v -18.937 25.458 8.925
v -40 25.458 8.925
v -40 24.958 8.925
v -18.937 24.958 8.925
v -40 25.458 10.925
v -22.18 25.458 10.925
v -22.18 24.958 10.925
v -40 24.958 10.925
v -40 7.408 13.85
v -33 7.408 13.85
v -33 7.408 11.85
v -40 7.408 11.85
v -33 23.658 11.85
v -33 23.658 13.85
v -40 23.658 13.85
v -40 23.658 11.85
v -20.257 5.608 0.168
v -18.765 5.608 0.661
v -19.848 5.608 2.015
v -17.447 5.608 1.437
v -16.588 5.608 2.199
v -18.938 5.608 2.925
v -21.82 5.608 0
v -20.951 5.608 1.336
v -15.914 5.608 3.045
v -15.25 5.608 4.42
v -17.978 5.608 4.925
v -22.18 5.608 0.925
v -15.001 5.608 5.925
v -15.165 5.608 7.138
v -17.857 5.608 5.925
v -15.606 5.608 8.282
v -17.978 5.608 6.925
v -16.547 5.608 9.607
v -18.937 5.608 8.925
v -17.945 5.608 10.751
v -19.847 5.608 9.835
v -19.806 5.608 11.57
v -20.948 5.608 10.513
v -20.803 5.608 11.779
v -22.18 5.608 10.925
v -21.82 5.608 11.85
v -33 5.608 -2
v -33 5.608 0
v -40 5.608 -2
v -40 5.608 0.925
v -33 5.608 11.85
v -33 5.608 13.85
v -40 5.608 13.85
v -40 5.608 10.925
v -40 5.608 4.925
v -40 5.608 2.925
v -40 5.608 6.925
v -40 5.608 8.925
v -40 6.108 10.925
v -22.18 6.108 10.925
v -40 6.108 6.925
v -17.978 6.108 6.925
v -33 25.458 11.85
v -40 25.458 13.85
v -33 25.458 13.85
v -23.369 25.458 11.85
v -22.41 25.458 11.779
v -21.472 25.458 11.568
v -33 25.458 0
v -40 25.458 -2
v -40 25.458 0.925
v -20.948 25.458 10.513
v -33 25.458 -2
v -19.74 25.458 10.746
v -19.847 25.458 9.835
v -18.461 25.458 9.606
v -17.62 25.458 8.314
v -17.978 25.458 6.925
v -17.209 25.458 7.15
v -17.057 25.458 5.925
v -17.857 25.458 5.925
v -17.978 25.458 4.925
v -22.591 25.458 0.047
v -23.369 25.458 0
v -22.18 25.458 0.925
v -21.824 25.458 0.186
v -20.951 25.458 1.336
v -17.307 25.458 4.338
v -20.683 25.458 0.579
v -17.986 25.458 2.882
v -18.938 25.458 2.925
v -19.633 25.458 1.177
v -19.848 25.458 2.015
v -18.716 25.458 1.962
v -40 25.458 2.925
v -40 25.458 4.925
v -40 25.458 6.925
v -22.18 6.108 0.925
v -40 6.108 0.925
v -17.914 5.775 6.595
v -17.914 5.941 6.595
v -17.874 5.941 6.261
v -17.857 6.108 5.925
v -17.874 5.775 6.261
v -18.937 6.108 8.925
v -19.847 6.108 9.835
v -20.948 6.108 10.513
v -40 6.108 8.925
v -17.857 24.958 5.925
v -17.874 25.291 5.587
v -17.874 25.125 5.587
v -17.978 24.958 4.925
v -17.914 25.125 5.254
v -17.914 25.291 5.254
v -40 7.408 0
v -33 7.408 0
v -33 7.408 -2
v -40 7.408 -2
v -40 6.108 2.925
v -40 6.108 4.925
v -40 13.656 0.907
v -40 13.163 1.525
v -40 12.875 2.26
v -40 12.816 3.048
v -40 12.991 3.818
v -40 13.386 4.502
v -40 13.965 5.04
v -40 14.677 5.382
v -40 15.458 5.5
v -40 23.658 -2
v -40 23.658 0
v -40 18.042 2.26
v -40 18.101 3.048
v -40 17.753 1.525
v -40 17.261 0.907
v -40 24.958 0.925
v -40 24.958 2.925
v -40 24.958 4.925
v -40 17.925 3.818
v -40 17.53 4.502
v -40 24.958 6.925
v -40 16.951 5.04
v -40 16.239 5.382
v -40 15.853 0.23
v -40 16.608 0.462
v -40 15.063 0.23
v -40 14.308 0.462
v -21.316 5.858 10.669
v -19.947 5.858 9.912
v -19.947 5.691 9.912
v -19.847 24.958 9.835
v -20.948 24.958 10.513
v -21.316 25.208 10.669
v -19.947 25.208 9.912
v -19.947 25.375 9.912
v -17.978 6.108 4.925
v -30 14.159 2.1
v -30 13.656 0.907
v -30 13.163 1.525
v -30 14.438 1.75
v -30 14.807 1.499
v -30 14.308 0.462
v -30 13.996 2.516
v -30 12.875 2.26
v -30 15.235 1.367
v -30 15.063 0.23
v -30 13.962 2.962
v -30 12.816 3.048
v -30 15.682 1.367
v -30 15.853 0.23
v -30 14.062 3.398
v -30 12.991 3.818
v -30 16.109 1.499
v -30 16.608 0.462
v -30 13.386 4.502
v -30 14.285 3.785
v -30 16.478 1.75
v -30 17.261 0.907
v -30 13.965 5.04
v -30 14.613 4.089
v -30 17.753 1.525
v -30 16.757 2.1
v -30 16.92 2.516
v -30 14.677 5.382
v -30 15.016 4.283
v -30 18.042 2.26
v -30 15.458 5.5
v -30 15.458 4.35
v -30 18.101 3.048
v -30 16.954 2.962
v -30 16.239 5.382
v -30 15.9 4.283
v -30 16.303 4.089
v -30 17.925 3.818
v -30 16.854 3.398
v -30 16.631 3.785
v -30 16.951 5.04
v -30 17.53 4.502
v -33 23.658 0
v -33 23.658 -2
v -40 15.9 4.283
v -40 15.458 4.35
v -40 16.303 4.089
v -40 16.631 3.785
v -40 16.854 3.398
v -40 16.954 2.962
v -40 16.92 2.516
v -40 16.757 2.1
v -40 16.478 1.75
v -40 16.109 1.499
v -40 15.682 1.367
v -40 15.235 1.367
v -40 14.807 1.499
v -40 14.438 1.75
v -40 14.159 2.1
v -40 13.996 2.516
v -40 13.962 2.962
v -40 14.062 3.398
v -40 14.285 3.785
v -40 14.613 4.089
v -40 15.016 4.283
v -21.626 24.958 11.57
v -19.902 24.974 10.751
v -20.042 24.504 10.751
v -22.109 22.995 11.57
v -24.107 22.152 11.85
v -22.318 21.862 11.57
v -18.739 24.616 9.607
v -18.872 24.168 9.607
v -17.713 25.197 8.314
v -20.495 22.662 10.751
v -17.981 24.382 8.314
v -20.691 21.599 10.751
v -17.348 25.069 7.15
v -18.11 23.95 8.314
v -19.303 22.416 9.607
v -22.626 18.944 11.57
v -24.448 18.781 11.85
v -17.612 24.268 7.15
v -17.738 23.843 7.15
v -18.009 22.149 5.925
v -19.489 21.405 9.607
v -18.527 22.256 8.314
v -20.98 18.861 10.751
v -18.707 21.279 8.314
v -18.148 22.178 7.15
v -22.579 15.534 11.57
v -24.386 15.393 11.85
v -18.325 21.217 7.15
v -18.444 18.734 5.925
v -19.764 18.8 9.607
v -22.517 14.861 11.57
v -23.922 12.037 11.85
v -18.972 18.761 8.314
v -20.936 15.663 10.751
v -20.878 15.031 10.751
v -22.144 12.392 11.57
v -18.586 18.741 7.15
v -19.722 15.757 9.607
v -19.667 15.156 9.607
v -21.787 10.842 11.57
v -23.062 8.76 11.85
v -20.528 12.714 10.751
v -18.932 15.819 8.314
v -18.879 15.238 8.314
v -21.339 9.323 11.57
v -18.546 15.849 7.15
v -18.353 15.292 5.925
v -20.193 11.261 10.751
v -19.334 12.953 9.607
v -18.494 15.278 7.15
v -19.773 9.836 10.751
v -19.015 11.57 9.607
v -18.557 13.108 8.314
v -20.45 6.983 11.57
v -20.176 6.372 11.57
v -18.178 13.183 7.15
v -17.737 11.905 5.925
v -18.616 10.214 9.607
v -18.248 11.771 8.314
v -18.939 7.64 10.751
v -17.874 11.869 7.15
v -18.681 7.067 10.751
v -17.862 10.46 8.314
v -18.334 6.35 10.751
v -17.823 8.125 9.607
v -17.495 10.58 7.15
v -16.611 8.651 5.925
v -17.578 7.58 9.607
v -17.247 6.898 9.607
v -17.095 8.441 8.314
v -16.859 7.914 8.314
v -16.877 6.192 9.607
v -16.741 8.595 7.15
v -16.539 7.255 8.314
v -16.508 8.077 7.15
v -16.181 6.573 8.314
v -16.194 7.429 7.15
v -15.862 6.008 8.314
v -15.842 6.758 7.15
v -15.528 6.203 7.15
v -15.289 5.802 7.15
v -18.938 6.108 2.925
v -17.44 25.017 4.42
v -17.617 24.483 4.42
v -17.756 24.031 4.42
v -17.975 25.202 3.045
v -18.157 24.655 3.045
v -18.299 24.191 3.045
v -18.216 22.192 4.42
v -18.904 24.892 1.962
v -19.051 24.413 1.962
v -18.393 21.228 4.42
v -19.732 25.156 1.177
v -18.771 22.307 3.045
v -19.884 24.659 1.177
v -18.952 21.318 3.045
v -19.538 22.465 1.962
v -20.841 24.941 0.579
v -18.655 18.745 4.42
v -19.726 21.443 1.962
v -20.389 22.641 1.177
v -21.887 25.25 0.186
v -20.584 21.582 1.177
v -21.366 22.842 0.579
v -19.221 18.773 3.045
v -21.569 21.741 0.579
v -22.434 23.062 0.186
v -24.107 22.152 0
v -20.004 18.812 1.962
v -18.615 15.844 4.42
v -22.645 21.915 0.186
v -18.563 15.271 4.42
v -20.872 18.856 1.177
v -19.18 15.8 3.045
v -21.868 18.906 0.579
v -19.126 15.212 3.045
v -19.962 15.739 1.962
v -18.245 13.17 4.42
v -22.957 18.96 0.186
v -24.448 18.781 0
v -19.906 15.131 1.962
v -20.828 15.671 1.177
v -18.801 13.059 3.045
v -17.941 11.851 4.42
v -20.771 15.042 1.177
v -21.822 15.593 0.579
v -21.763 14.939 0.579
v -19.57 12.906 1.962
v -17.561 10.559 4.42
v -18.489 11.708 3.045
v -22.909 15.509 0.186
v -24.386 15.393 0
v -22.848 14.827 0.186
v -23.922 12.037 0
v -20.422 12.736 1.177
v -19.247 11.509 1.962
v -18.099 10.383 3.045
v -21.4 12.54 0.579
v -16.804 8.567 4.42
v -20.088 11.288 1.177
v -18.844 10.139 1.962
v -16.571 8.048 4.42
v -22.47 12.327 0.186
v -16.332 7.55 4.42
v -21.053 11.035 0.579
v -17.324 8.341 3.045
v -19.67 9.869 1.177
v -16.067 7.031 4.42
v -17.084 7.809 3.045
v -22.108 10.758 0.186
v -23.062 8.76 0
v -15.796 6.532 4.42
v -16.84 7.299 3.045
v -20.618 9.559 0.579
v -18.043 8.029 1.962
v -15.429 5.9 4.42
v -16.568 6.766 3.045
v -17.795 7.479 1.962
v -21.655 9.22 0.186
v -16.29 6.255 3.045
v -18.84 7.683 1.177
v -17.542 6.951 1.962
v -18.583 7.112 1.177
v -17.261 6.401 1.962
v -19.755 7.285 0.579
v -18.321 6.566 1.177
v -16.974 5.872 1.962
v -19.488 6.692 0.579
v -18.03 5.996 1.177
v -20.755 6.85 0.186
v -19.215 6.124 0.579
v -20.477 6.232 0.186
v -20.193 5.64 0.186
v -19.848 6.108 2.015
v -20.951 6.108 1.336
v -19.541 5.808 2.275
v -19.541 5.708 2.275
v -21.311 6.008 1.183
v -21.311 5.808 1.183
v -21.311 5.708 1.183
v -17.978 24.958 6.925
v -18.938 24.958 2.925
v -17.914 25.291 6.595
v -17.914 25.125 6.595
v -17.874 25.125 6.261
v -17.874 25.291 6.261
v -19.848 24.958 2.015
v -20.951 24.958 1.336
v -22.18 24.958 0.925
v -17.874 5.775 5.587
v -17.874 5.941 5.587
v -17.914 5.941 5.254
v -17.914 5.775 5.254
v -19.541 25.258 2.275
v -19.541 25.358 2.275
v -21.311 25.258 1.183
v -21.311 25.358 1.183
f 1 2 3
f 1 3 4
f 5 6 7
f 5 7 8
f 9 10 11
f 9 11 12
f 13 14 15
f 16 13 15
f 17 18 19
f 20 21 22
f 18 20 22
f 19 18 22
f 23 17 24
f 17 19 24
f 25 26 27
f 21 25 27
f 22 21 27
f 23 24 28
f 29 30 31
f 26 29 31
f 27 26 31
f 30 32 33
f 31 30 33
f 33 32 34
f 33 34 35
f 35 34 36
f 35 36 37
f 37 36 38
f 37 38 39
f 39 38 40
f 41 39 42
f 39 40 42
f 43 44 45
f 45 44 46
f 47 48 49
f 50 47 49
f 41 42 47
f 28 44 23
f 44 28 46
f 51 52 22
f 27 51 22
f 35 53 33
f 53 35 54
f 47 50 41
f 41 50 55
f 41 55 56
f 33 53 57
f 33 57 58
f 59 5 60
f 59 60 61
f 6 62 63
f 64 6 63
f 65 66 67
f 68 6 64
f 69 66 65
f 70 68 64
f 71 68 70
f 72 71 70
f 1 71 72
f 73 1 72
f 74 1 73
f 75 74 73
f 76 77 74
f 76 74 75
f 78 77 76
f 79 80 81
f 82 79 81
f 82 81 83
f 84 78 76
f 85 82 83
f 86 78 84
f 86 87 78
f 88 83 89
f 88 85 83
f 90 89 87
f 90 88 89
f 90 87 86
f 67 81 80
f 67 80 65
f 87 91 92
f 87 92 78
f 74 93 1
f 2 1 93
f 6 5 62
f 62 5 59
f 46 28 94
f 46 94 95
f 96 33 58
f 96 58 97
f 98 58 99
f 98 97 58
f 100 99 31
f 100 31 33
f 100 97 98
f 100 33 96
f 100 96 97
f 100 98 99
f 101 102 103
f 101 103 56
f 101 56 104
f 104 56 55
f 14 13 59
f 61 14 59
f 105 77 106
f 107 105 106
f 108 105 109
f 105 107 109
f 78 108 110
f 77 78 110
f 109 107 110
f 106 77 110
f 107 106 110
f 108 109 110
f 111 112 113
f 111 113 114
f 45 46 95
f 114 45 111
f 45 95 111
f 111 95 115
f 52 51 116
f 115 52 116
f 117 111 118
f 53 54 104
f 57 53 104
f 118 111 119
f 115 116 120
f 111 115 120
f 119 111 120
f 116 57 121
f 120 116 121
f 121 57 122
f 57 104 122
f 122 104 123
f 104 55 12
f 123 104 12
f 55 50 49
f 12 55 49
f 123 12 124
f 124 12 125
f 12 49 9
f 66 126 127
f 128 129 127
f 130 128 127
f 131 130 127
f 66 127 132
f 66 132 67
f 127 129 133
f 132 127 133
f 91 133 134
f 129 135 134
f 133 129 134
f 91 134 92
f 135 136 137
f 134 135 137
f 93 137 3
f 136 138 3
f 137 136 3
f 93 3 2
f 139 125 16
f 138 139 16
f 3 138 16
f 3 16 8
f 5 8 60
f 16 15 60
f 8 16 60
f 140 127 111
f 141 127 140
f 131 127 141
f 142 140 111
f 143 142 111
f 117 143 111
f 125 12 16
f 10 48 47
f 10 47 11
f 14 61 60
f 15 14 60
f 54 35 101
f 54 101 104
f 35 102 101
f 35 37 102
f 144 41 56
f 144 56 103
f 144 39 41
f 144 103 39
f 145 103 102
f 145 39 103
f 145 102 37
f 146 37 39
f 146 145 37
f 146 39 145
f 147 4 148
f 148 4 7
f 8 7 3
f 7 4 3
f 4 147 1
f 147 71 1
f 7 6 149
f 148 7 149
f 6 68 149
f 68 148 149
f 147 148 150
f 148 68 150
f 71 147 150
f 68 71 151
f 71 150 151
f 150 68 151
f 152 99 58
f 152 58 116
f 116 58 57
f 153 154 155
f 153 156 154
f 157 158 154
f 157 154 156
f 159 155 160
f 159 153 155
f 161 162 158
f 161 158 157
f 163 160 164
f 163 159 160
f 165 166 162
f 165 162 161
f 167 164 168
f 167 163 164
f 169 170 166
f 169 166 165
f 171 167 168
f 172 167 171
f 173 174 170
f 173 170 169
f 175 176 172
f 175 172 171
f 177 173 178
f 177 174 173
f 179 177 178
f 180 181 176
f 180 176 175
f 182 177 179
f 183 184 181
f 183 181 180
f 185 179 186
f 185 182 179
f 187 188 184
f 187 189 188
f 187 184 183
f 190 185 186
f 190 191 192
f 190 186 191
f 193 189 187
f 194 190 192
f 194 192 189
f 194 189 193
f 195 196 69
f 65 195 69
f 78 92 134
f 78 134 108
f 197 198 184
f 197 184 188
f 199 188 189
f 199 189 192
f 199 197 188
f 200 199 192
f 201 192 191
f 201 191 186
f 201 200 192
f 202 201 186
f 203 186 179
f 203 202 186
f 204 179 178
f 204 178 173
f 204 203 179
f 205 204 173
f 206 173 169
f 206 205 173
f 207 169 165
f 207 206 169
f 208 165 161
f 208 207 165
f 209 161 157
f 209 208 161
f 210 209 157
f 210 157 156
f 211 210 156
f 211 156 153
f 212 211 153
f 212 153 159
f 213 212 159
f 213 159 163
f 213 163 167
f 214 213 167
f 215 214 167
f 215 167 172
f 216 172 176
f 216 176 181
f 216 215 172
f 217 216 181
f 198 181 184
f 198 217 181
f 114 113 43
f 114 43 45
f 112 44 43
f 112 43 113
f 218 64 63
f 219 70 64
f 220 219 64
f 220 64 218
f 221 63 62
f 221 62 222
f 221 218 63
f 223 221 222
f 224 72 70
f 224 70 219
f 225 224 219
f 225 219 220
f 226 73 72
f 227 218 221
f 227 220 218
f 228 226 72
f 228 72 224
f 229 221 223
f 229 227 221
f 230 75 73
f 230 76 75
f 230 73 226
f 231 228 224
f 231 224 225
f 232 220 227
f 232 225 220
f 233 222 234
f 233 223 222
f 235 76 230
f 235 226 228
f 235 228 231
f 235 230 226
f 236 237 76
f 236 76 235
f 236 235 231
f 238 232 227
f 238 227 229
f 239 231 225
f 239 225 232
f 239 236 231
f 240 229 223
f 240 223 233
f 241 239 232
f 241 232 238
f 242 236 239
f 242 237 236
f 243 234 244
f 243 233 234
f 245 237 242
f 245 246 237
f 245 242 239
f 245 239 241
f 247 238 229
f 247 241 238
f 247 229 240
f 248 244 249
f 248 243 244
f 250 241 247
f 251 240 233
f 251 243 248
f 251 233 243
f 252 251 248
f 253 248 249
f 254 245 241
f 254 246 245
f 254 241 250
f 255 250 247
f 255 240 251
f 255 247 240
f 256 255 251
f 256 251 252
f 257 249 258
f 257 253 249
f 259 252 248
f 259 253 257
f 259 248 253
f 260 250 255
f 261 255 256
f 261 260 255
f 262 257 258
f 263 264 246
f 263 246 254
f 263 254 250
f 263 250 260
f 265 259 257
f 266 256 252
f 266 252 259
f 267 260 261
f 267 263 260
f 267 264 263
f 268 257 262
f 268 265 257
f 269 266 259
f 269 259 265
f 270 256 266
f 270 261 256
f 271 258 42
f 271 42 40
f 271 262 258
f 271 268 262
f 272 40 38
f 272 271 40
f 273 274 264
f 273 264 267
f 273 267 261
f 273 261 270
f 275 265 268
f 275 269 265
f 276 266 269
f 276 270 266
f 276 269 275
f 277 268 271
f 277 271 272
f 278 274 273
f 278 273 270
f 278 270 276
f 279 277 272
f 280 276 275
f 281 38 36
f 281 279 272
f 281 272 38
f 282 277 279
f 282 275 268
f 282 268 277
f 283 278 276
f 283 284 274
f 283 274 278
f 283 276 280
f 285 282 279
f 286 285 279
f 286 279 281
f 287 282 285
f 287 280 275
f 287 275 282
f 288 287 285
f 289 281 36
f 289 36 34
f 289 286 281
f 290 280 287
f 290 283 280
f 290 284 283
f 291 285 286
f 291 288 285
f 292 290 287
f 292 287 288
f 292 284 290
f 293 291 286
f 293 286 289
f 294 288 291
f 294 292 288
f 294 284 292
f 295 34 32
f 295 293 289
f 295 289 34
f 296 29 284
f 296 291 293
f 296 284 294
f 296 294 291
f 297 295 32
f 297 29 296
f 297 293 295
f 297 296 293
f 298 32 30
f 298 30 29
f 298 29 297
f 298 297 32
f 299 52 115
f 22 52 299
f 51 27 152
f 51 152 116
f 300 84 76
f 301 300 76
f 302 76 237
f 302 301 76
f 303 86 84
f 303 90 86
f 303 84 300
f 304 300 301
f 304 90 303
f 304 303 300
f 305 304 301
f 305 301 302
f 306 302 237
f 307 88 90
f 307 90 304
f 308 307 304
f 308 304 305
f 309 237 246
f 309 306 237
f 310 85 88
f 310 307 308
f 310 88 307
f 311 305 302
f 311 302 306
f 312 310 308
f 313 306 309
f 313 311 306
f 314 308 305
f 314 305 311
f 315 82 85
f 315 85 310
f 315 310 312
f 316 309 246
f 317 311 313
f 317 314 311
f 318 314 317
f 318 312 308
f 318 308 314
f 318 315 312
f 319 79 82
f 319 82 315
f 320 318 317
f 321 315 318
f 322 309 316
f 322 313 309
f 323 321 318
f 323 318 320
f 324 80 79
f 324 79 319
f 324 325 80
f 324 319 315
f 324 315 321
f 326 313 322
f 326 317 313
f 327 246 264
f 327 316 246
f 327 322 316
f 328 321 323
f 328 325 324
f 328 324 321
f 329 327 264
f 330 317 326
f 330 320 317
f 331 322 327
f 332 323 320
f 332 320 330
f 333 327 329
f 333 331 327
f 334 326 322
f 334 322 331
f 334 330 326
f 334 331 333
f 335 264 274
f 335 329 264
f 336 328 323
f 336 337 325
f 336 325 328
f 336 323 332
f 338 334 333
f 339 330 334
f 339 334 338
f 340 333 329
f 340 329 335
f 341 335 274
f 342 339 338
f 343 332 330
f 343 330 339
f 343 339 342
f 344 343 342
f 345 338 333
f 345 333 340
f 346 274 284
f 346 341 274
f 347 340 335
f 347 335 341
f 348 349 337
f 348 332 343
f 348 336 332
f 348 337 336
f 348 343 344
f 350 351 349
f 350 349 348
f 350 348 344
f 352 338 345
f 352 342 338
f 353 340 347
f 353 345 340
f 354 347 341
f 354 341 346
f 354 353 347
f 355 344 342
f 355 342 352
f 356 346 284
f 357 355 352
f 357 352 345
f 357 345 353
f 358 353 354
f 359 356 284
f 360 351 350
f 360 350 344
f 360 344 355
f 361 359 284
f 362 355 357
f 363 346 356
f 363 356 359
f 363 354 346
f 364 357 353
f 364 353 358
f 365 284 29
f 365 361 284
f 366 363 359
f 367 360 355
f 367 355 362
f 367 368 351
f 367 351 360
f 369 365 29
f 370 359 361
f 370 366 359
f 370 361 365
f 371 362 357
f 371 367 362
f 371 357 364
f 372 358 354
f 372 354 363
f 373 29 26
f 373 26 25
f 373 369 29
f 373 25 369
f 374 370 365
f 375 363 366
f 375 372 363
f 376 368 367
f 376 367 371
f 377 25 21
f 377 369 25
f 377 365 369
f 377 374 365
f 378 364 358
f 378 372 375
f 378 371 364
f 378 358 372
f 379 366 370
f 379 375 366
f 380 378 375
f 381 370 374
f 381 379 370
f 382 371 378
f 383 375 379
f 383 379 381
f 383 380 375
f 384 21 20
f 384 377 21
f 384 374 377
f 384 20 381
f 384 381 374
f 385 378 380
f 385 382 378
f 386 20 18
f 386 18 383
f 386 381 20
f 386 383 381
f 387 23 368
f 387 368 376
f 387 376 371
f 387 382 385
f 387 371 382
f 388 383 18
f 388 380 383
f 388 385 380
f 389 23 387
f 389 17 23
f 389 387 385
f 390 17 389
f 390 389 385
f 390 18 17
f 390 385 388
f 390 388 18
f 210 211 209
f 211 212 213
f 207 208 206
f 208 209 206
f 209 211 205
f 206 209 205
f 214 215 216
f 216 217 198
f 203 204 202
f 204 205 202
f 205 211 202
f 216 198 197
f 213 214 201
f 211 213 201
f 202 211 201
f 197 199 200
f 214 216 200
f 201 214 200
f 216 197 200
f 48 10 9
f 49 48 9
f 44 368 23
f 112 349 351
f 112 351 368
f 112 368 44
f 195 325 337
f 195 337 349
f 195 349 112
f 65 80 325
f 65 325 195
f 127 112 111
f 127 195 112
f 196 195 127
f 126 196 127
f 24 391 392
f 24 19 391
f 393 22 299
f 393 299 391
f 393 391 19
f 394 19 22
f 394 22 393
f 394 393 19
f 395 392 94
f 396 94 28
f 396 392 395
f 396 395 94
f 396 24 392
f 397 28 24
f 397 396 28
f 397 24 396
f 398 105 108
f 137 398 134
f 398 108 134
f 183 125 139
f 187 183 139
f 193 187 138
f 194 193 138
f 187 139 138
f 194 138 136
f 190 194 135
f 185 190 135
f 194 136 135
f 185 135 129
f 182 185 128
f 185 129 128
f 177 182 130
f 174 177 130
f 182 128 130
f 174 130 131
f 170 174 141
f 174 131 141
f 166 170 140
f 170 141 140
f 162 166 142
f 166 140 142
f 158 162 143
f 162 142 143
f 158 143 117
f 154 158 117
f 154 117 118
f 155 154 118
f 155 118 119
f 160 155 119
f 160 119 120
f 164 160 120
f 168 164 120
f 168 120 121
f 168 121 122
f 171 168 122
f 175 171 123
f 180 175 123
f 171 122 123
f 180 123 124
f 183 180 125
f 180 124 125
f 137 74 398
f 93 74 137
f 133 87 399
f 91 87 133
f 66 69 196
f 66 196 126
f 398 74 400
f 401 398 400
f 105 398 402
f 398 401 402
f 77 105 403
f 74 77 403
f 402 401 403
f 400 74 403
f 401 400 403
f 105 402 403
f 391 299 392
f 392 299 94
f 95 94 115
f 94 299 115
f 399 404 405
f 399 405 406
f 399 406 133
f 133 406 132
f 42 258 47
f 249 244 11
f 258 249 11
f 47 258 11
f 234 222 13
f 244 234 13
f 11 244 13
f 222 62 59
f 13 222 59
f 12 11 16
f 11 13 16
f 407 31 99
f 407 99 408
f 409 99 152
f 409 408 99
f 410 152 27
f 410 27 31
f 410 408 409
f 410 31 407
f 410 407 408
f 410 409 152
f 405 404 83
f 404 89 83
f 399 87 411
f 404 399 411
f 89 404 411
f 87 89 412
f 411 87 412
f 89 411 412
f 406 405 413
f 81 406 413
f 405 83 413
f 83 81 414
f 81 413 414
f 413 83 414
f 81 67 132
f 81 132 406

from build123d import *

# Parameters (mm, degrees)
BOSS_EXTRUDE1_DEPTH      = 11.85
BOSS_EXTRUDE2_DEPTH      = 2
BOSS_EXTRUDE2_DEPTH_BACK = 13.85
SKETCH2_W                = 7
SKETCH2_H                = 1.8
FILLET1_R                = 6
CUT_EXTRUDE1_DEPTH       = 0.5
CUT_EXTRUDE2_DEPTH       = 0.5
SKETCH6_R                = 2.65
SKETCH6_R_2              = 1.5
CUT_EXTRUDE3_DEPTH       = 10


with BuildPart() as part:
    # Sketch1 → Boss-Extrude1 (new body)
    with BuildSketch(Plane.XY):
        with BuildLine():
            Line((-40, 25.458108108), (-17.056531053, 25.458108108))
            ThreePointArc((-17.056531053, 25.458108108), (-18.352562381, 15.292302634), (-15, 5.608108108))
            Line((-15, 5.608108108), (-40, 5.608108108))
            Line((-40, 5.608108108), (-40, 25.458108108))
        make_face()
    extrude(amount=BOSS_EXTRUDE1_DEPTH)

    # Sketch2 → Boss-Extrude2 (add, two sides: drawn at the far end of the back side and taken through both)
    with BuildSketch(Plane(origin=(0, 0, 0), x_dir=(-1, 0, 0), z_dir=(0, 0, -1)).offset(-BOSS_EXTRUDE2_DEPTH_BACK)):
        with Locations((36.5, 6.508108108)):
            Rectangle(SKETCH2_W, SKETCH2_H)
        with Locations((36.5, 24.558108108)):
            Rectangle(SKETCH2_W, SKETCH2_H)
    extrude(amount=BOSS_EXTRUDE2_DEPTH + BOSS_EXTRUDE2_DEPTH_BACK)

    # Fillet1
    # the kernel refuses this fillet: 6 mm, written as the material it takes off along each edge
    with BuildSketch(Plane(origin=(4, 17.608108108, 0), x_dir=(-0.5195868737353421, 0.854417626598336, 0), z_dir=(0.854417626598336, 0.5195868737353421, 0))) as fillet1_piece_1:
        with BuildLine():
            CenterArc((22.472205054 + FILLET1_R, FILLET1_R), FILLET1_R, 180, 90)
            Line((22.472205054 + FILLET1_R, 0), (22.472205054, 0))
            Line((22.472205054, 0), (22.472205054, FILLET1_R))
        make_face()
    revolve(axis=Axis((4, 17.608108108, 0), (0, 0, 1)), revolution_arc=129.220802233, mode=Mode.SUBTRACT)
    with BuildSketch(Plane(origin=(4, 17.608108108, 11.85), x_dir=(-0.5195868737353421, 0.854417626598336, 0), z_dir=(0.854417626598336, 0.5195868737353421, 0))) as fillet1_piece_2:
        with BuildLine():
            CenterArc((22.472205054 + FILLET1_R, -FILLET1_R), FILLET1_R, 90, 90)
            Line((22.472205054, -FILLET1_R), (22.472205054, 0))
            Line((22.472205054, 0), (22.472205054 + FILLET1_R, 0))
        make_face()
    revolve(axis=Axis((4, 17.608108108, 11.85), (0, 0, 1)), revolution_arc=129.220802233, mode=Mode.SUBTRACT)

    # Sketch3 → Cut-Extrude1 (cut)
    with BuildSketch(Plane(origin=(0, 25.458108108, 0), x_dir=(1, 0, 0), z_dir=(0, 1, 0))):
        with BuildLine():
            Line((-40, -0.925), (-22.180241126, -0.925))
            add(Edge.make_bspline(
                [(-18.937526934, -2.925), (-19.013227922, -2.828512493), (-19.092514949, -2.73433601), (-19.290739716, -2.514692345), (-19.412819443, -2.391961398), (-19.796517456, -2.041181837), (-20.076726357, -1.829898628), (-20.674341708, -1.461904013), (-20.986869841, -1.307747212), (-21.591258811, -1.074971042), (-21.88385471, -0.988046248), (-22.180241126, -0.925)],
                knots=[0.393521627, 0.393521627, 0.393521627, 0.393521627, 0.4375, 0.4375, 0.5, 0.5, 0.625, 0.625, 0.75, 0.75, 0.857744944, 0.857744944, 0.857744944, 0.857744944], degree=3))
            Line((-18.937526934, -2.925), (-40, -2.925))
            Line((-40, -2.925), (-40, -0.925))
        make_face()
        with BuildLine():
            Line((-40, -4.925), (-17.97760602, -4.925))
            add(Edge.make_bspline(
                [(-17.857114262, -5.924996789), (-17.862389732, -5.585330665), (-17.903230985, -5.251628442), (-17.97760602, -4.925)],
                knots=[0, 0, 0, 0, 0.123073848, 0.123073848, 0.123073848, 0.123073848], degree=3))
            add(Edge.make_bspline(
                [(-17.977607618, -6.925), (-17.903108355, -6.597642735), (-17.862351336, -6.26181668), (-17.857114262, -5.924996789)],
                knots=[0.87810057, 0.87810057, 0.87810057, 0.87810057, 1, 1, 1, 1], degree=3))
            Line((-17.977607618, -6.925), (-40, -6.925))
            Line((-40, -6.925), (-40, -4.925))
        make_face()
        with BuildLine():
            Line((-40, -8.925), (-18.937485208, -8.925))
            add(Edge.make_bspline(
                [(-22.180090087, -10.925), (-22.058031588, -10.899076779), (-21.936790659, -10.869159263), (-21.647506804, -10.787627729), (-21.479286663, -10.731759415), (-20.988005272, -10.542973422), (-20.675799804, -10.388674568), (-20.230975304, -10.115240101), (-20.087143687, -10.017400974), (-19.80724707, -9.806950573), (-19.671333831, -9.694234428), (-19.322525279, -9.375728013), (-19.120509969, -9.15842179), (-18.937485208, -8.925)],
                knots=[0.142746843, 0.142746843, 0.142746843, 0.142746843, 0.1875, 0.1875, 0.25, 0.25, 0.375, 0.375, 0.4375, 0.4375, 0.5, 0.5, 0.607411447, 0.607411447, 0.607411447, 0.607411447], degree=3))
            Line((-22.180090087, -10.925), (-40, -10.925))
            Line((-40, -10.925), (-40, -8.925))
        make_face()
    extrude(amount=-CUT_EXTRUDE1_DEPTH, mode=Mode.SUBTRACT)

    # Sketch4 → Cut-Extrude2 (cut)
    with BuildSketch(Plane.XZ.offset(-5.608108108)):
        with BuildLine():
            Line((-18.937485208, 8.925), (-40, 8.925))
            Line((-40, 8.925), (-40, 10.925))
            Line((-40, 10.925), (-22.180090087, 10.925))
            add(Edge.make_bspline(
                [(-22.180090087, 10.925), (-22.058031589, 10.899076779), (-21.936790659, 10.869159263), (-21.647506804, 10.787627729), (-21.479286663, 10.731759415), (-20.988005272, 10.542973422), (-20.675799804, 10.388674568), (-20.230975304, 10.115240101), (-20.087143687, 10.017400974), (-19.80724707, 9.806950573), (-19.671333831, 9.694234428), (-19.322525301, 9.375728033), (-19.12051001, 9.158421833), (-18.937485208, 8.925)],
                knots=[0.392588564, 0.392588564, 0.392588564, 0.392588564, 0.437341721, 0.437341721, 0.499841721, 0.499841721, 0.624841721, 0.624841721, 0.687341721, 0.687341721, 0.749841721, 0.749841721, 0.857253157, 0.857253157, 0.857253157, 0.857253157], degree=3))
        make_face()
        with BuildLine():
            Line((-40, 6.925), (-17.977607618, 6.925))
            add(Edge.make_bspline(
                [(-17.977607618, 6.925), (-17.903108355, 6.597642735), (-17.862351336, 6.26181668), (-17.857114262, 5.924996789)],
                knots=[0, 0, 0, 0, 0.12189943, 0.12189943, 0.12189943, 0.12189943], degree=3))
            add(Edge.make_bspline(
                [(-17.857114262, 5.924996789), (-17.862389732, 5.585330665), (-17.903230985, 5.251628442), (-17.97760602, 4.925)],
                knots=[0.876926152, 0.876926152, 0.876926152, 0.876926152, 1, 1, 1, 1], degree=3))
            Line((-17.97760602, 4.925), (-40, 4.925))
            Line((-40, 4.925), (-40, 6.925))
        make_face()
        with BuildLine():
            Line((-40, 2.925), (-18.937526934, 2.925))
            add(Edge.make_bspline(
                [(-18.937526934, 2.925), (-19.013227922, 2.828512493), (-19.092514949, 2.73433601), (-19.290739716, 2.514692345), (-19.412819443, 2.391961398), (-19.796517456, 2.041181837), (-20.076726357, 1.829898628), (-20.674341708, 1.461904013), (-20.986869841, 1.307747212), (-21.591258789, 1.07497105), (-21.883854665, 0.988046261), (-22.180241126, 0.925)],
                knots=[0.142255064, 0.142255064, 0.142255064, 0.142255064, 0.186233438, 0.186233438, 0.248733438, 0.248733438, 0.373733438, 0.373733438, 0.498733438, 0.498733438, 0.606478373, 0.606478373, 0.606478373, 0.606478373], degree=3))
            Line((-22.180241126, 0.925), (-40, 0.925))
            Line((-40, 0.925), (-40, 2.925))
        make_face()
    extrude(amount=-CUT_EXTRUDE2_DEPTH, mode=Mode.SUBTRACT)

    # Sketch6 → Cut-Extrude3 (cut)
    with BuildSketch(Plane.ZY.offset(40)):
        with Locations((2.85, 15.458108108)):
            Circle(SKETCH6_R)
        with Locations((2.85, 15.458108108)):
            Circle(SKETCH6_R_2, mode=Mode.SUBTRACT)
    extrude(amount=-CUT_EXTRUDE3_DEPTH, mode=Mode.SUBTRACT)


solid = part.part
